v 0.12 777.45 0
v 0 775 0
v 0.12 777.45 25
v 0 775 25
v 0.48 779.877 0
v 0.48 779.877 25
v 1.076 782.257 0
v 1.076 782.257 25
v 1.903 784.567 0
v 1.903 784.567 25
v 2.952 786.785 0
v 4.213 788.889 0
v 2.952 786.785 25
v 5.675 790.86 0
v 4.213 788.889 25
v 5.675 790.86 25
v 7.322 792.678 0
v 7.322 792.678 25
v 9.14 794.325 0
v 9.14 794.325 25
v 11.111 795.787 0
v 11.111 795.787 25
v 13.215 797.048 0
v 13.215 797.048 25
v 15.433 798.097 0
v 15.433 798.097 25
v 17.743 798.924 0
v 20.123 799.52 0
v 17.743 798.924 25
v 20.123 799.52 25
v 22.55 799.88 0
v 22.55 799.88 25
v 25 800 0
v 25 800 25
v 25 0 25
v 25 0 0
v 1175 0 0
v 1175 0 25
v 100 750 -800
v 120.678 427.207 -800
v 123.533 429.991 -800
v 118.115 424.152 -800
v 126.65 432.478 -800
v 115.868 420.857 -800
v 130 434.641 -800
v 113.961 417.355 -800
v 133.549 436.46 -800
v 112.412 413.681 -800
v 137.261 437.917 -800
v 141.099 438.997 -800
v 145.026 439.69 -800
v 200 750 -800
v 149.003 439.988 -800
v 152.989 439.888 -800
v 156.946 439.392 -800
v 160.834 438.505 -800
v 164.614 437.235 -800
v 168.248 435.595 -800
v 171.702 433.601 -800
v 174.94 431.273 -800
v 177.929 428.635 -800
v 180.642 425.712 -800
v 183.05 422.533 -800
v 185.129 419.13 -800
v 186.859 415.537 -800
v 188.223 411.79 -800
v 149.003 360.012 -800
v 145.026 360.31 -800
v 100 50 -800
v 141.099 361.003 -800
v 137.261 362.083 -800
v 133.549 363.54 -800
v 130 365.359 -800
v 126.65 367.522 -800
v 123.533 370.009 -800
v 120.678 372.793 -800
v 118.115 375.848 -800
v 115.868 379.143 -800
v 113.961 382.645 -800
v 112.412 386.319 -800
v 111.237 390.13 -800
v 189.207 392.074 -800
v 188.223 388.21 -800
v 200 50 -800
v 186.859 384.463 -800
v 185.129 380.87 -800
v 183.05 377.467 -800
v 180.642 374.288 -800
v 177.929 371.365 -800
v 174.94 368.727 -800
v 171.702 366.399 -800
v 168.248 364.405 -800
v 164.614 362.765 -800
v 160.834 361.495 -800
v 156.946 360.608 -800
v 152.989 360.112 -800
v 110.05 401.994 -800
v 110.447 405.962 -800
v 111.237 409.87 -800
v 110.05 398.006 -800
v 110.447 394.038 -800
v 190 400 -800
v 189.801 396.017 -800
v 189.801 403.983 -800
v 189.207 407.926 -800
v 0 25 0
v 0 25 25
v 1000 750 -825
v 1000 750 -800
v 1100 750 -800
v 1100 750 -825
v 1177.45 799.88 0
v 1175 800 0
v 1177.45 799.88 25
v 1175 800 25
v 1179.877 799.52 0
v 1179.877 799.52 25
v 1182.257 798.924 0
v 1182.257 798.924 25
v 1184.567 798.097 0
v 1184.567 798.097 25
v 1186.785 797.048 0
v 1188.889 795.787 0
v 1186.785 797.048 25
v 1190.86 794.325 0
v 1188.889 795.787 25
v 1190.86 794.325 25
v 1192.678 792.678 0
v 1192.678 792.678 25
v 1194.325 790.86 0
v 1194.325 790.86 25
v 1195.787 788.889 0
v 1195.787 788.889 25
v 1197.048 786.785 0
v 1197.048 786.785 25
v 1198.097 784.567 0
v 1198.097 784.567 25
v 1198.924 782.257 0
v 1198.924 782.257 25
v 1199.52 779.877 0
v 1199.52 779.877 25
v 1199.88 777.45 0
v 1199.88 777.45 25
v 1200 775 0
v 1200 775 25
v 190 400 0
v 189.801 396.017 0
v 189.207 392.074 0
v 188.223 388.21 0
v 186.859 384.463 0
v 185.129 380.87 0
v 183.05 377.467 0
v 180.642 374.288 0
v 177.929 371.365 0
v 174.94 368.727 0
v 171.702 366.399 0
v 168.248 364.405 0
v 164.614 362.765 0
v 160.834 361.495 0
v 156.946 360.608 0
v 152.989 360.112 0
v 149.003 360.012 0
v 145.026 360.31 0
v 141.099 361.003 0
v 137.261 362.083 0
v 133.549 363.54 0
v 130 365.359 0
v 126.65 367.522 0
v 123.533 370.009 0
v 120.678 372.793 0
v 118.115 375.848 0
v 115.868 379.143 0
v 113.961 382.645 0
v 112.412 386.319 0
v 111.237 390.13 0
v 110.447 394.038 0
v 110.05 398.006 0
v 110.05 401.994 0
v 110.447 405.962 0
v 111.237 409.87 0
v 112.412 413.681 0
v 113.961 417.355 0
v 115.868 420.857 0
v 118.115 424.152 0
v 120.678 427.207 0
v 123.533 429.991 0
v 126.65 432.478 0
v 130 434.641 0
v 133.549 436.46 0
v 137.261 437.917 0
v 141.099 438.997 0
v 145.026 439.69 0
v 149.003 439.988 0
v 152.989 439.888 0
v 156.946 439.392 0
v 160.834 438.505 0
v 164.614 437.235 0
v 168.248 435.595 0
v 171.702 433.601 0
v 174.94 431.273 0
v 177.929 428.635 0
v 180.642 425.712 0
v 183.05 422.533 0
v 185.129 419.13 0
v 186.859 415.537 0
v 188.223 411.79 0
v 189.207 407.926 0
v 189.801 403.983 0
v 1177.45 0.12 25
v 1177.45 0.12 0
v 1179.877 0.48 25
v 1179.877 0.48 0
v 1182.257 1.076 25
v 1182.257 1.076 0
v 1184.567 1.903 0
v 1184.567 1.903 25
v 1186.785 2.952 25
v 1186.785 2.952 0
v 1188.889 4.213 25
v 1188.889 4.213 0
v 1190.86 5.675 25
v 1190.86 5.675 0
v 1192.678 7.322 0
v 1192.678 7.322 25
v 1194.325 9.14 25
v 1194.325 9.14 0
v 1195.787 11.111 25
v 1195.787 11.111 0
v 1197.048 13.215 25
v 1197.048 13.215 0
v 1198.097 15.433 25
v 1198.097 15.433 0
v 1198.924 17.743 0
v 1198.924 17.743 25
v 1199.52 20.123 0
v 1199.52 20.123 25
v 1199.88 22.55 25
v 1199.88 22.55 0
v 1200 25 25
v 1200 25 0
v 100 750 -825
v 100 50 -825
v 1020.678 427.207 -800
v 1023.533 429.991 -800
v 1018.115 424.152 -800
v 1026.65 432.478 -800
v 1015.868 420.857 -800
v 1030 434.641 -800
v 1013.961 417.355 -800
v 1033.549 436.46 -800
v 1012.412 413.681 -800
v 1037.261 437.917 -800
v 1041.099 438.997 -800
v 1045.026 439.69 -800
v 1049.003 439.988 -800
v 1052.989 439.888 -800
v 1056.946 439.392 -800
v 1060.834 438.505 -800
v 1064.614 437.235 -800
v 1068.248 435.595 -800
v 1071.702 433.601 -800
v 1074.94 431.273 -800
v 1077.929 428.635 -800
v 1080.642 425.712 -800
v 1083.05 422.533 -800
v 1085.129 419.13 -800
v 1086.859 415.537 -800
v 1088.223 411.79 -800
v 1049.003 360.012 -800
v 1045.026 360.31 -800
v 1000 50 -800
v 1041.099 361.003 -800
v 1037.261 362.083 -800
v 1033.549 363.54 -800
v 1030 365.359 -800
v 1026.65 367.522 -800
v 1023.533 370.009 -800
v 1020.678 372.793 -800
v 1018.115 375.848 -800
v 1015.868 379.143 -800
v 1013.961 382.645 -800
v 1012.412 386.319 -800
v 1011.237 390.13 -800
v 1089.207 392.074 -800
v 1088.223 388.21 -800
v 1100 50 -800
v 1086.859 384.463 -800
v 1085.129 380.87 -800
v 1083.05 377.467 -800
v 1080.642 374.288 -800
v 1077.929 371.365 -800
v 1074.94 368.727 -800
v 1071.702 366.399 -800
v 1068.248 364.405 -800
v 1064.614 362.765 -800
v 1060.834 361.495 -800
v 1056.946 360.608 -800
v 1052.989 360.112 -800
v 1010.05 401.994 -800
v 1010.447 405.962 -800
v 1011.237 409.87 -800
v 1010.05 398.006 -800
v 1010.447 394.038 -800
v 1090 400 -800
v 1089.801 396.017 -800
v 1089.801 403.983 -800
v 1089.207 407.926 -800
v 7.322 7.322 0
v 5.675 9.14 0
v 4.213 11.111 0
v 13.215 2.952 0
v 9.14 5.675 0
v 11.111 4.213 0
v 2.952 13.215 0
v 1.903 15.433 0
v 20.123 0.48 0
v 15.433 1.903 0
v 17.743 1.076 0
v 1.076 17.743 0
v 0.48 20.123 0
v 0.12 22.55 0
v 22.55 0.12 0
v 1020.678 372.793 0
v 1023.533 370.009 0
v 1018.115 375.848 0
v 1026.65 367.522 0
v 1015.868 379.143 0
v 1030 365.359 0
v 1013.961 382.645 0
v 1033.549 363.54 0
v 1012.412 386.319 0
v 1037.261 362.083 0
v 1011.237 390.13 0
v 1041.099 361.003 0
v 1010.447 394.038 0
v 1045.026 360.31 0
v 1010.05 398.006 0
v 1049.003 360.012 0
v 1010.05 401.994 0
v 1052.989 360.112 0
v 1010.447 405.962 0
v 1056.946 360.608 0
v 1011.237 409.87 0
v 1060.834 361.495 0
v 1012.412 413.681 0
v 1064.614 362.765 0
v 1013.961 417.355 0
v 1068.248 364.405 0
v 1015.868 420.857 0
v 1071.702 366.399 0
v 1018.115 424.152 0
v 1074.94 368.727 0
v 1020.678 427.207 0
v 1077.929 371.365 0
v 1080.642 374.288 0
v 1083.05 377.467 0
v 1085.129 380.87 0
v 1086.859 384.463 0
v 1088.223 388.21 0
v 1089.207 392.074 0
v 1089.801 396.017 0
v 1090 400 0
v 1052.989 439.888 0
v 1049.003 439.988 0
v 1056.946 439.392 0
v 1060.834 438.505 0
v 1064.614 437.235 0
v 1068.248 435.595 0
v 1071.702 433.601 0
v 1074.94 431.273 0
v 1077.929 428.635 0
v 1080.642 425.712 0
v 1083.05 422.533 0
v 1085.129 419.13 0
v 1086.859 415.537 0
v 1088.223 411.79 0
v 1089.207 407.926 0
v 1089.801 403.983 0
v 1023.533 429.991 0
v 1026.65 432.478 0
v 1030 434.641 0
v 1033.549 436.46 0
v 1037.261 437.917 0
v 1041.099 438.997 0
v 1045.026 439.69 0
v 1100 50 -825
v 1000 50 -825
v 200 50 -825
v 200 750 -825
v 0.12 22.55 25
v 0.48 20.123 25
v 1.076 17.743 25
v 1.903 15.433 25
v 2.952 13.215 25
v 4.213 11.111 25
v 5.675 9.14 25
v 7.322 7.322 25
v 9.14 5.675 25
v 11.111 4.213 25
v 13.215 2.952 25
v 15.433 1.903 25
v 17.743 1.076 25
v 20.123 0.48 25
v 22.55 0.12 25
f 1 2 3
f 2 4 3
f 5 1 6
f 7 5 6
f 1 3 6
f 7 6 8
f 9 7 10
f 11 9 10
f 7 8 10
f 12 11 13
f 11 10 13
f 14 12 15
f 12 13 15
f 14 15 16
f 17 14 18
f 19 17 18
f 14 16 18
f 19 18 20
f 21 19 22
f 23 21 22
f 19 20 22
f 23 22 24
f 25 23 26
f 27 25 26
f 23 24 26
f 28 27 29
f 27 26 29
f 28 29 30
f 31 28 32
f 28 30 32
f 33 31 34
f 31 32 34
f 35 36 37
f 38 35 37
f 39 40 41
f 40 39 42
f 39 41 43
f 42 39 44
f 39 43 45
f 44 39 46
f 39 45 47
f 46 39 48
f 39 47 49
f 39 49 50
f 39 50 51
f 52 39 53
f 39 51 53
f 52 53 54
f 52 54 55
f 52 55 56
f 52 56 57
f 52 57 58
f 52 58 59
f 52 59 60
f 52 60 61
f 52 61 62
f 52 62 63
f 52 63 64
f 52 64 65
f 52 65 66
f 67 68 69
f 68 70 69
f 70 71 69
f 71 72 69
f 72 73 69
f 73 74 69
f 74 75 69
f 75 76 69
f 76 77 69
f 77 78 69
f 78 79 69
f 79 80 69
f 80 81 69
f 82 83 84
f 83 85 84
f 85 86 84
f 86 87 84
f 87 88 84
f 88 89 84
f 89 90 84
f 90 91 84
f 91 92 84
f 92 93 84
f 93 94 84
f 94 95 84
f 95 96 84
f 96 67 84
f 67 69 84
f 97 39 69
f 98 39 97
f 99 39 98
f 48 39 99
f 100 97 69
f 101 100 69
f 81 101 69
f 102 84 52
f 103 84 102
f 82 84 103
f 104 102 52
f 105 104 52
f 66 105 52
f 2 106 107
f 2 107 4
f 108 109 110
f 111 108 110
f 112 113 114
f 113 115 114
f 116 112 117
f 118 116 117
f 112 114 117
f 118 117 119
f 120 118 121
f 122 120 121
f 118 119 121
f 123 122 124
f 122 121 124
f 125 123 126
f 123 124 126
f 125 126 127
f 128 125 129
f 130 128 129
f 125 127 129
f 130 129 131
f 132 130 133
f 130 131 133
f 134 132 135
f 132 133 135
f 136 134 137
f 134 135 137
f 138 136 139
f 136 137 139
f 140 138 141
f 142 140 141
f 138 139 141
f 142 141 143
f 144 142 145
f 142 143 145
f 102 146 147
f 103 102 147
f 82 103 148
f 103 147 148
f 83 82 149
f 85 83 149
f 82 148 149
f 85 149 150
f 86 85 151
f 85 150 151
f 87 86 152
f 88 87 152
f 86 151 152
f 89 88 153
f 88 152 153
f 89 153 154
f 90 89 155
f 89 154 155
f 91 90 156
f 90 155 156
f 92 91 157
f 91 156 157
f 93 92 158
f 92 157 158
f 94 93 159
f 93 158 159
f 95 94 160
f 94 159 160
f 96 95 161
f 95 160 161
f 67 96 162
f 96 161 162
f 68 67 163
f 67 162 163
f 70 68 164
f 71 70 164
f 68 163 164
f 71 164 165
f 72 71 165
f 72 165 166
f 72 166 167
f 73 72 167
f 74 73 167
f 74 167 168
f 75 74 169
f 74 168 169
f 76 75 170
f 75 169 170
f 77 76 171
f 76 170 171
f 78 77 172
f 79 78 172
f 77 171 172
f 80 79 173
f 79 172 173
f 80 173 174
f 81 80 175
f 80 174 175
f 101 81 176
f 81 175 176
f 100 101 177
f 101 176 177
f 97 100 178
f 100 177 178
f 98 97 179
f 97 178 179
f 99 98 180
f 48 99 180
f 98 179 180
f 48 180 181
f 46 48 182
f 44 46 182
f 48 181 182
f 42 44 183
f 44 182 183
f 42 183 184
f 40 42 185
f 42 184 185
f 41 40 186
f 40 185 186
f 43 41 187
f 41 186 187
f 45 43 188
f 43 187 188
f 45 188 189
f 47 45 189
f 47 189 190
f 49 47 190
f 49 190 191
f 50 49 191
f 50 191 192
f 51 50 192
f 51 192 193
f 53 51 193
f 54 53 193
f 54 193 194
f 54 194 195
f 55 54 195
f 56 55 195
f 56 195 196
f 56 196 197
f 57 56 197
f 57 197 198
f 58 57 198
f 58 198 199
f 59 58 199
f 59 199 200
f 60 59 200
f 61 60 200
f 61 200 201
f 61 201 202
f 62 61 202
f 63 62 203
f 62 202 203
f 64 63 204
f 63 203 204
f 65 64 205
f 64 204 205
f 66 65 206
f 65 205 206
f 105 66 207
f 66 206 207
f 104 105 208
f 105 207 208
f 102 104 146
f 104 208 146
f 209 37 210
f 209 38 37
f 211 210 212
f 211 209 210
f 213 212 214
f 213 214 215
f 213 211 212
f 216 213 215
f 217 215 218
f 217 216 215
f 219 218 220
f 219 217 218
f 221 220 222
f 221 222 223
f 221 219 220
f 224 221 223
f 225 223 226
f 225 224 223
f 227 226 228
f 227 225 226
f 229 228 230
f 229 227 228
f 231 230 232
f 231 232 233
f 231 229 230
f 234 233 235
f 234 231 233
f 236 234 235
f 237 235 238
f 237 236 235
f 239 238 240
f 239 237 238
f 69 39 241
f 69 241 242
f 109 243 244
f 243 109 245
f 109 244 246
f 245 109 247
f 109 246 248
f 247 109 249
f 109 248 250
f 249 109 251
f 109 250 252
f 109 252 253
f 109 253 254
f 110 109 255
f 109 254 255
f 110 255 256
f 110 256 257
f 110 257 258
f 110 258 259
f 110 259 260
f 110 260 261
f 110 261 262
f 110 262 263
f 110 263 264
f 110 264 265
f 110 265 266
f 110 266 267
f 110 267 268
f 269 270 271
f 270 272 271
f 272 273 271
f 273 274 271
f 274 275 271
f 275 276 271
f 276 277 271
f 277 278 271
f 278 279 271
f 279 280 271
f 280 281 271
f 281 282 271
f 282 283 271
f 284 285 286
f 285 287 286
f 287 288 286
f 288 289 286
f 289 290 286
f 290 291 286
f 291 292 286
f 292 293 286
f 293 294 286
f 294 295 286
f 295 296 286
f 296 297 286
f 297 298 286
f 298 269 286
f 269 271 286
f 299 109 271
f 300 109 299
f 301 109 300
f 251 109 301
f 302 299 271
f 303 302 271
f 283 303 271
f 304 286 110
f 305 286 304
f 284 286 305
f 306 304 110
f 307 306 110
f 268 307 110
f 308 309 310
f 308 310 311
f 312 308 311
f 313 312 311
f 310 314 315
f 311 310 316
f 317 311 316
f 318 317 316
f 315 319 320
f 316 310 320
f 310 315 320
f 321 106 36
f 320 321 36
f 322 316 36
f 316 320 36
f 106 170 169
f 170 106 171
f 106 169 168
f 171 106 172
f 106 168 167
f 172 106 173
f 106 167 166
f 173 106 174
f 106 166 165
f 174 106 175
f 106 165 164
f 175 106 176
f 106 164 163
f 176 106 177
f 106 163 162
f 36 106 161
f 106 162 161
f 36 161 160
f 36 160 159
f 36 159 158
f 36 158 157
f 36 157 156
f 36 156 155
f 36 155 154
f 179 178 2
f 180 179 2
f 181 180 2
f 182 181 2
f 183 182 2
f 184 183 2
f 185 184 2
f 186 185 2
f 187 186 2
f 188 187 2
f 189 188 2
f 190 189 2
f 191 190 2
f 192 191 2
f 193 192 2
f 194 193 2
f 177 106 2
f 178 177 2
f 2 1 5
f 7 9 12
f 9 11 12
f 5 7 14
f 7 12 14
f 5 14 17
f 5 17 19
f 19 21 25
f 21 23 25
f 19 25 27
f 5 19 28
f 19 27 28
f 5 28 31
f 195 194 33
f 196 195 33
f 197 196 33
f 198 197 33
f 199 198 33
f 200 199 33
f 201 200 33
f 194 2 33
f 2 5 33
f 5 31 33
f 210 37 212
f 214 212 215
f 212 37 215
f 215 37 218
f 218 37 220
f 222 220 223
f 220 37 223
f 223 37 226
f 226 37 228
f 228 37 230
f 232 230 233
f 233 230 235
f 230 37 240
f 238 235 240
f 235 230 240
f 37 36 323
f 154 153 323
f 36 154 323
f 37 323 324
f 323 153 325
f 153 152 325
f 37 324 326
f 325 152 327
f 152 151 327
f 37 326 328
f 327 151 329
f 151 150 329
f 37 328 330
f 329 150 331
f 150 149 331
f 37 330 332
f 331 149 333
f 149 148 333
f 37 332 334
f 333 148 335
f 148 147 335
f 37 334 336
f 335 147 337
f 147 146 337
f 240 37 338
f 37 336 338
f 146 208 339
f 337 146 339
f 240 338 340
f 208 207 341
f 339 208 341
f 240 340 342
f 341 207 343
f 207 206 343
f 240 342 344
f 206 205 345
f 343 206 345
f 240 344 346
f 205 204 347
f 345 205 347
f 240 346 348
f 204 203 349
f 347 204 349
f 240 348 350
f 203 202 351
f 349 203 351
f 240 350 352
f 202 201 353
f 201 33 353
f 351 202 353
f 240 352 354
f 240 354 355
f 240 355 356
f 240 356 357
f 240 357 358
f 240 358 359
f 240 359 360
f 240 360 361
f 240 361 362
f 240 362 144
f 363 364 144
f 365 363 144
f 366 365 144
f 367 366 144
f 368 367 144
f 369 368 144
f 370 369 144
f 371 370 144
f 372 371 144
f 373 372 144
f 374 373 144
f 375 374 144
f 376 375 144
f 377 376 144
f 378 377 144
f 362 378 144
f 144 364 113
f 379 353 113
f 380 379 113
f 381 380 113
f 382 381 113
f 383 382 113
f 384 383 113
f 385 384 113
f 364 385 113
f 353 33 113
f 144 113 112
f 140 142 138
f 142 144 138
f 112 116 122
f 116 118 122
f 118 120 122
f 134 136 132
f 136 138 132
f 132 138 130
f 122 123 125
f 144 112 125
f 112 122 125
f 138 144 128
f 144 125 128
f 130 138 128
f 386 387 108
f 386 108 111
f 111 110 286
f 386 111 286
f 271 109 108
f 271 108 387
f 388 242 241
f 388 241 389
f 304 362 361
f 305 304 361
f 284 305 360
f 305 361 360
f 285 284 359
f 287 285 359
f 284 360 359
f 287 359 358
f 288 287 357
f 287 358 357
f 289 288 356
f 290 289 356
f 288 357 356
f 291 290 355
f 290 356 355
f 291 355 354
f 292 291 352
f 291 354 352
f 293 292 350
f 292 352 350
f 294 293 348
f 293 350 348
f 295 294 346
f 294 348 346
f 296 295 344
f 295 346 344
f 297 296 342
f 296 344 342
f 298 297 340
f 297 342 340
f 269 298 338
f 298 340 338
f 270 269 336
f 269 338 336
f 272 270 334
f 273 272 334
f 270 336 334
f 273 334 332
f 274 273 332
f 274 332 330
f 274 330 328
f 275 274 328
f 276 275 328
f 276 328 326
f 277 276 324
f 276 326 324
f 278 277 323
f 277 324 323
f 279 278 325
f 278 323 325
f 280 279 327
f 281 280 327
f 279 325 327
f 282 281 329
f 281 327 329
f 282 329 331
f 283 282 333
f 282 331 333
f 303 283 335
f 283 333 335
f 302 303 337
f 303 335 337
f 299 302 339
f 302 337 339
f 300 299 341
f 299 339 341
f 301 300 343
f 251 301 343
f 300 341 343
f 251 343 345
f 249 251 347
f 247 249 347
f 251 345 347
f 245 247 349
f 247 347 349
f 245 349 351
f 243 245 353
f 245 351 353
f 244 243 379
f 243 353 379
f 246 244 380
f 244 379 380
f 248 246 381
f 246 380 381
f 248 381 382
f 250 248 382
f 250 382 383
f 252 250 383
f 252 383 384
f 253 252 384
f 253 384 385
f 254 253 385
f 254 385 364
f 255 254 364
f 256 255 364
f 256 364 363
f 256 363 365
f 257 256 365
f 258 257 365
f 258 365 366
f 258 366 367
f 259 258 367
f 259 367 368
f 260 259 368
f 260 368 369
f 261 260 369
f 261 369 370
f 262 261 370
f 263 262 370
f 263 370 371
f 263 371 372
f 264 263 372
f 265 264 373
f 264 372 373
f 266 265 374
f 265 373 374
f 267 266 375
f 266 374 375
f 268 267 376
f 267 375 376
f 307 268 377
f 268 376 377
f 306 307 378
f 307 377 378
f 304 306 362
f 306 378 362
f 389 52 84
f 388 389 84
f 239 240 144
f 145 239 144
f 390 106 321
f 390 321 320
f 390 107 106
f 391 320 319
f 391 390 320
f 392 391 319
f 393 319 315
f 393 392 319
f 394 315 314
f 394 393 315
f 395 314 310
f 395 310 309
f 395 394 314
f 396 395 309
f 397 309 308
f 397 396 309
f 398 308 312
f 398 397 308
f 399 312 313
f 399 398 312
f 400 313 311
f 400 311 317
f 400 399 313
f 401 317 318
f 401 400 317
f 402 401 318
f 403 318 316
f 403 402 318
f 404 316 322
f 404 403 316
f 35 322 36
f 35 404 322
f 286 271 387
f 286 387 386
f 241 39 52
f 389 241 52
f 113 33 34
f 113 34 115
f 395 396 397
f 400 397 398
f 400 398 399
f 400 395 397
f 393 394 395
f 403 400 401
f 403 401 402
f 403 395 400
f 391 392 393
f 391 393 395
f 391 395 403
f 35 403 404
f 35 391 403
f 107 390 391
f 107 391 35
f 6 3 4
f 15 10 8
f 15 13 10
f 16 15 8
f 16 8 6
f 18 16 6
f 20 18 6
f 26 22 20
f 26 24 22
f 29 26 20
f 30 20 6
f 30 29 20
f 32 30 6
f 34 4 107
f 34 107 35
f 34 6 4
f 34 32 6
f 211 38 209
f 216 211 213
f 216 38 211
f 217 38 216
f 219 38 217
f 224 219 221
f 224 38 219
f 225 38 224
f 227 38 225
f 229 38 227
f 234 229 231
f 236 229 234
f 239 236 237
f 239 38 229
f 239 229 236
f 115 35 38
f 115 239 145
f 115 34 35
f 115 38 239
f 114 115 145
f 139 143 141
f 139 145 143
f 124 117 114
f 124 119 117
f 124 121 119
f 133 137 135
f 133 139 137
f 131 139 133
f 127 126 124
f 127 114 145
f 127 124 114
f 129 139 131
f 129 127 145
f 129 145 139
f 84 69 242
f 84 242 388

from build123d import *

# Parameters (mm, degrees)
F0_W     = 1200
F0_H     = 800
F1_DEPTH = 25
F2_R     = 40
F3_DEPTH = 800
F4_W     = 100
F4_H     = 700
F5_DEPTH = 25
F6_W     = 100
F6_H     = 700
F7_DEPTH = 25
F8_R     = 25


with BuildPart() as f1:
    # F0 (on Top) → F1 (new body)
    with BuildSketch(Plane.XY):
        with Locations((600, 400)):
            Rectangle(F0_W, F0_H)
    extrude(amount=F1_DEPTH)

    # F2 (on face) → F3 (join)
    with BuildSketch(Plane(origin=(0, 0, 0), x_dir=(1, 0, 0), z_dir=(0, 0, -1))):
        with Locations((150, -400)):
            Circle(F2_R)
        with Locations((1050, -400)):
            Circle(F2_R)
    extrude(amount=F3_DEPTH)

    # F4 (on face) → F5 (join)
    with BuildSketch(Plane(origin=(0, 0, -800), x_dir=(1, 0, 0), z_dir=(0, 0, -1))):
        with Locations((150, -400)):
            Rectangle(F4_W, F4_H)
    extrude(amount=F5_DEPTH)

    # F6 (on face) → F7 (join)
    with BuildSketch(Plane(origin=(0, 0, -800), x_dir=(1, 0, 0), z_dir=(0, 0, -1))):
        with Locations((1050, -400)):
            Rectangle(F6_W, F6_H)
    extrude(amount=F7_DEPTH)

    # F8
    f8_edges = [f1.edges().sort_by_distance(p)[0] for p in [
        (1200, 0, 12.5),
        (1200, 800, 12.5),
        (0, 0, 12.5),
        (0, 800, 12.5),
    ]]
    fillet(f8_edges, radius=F8_R)


with BuildPart() as f9_1:
    # F9: copy of F1
    add(f1.part)


solid = f1.part
